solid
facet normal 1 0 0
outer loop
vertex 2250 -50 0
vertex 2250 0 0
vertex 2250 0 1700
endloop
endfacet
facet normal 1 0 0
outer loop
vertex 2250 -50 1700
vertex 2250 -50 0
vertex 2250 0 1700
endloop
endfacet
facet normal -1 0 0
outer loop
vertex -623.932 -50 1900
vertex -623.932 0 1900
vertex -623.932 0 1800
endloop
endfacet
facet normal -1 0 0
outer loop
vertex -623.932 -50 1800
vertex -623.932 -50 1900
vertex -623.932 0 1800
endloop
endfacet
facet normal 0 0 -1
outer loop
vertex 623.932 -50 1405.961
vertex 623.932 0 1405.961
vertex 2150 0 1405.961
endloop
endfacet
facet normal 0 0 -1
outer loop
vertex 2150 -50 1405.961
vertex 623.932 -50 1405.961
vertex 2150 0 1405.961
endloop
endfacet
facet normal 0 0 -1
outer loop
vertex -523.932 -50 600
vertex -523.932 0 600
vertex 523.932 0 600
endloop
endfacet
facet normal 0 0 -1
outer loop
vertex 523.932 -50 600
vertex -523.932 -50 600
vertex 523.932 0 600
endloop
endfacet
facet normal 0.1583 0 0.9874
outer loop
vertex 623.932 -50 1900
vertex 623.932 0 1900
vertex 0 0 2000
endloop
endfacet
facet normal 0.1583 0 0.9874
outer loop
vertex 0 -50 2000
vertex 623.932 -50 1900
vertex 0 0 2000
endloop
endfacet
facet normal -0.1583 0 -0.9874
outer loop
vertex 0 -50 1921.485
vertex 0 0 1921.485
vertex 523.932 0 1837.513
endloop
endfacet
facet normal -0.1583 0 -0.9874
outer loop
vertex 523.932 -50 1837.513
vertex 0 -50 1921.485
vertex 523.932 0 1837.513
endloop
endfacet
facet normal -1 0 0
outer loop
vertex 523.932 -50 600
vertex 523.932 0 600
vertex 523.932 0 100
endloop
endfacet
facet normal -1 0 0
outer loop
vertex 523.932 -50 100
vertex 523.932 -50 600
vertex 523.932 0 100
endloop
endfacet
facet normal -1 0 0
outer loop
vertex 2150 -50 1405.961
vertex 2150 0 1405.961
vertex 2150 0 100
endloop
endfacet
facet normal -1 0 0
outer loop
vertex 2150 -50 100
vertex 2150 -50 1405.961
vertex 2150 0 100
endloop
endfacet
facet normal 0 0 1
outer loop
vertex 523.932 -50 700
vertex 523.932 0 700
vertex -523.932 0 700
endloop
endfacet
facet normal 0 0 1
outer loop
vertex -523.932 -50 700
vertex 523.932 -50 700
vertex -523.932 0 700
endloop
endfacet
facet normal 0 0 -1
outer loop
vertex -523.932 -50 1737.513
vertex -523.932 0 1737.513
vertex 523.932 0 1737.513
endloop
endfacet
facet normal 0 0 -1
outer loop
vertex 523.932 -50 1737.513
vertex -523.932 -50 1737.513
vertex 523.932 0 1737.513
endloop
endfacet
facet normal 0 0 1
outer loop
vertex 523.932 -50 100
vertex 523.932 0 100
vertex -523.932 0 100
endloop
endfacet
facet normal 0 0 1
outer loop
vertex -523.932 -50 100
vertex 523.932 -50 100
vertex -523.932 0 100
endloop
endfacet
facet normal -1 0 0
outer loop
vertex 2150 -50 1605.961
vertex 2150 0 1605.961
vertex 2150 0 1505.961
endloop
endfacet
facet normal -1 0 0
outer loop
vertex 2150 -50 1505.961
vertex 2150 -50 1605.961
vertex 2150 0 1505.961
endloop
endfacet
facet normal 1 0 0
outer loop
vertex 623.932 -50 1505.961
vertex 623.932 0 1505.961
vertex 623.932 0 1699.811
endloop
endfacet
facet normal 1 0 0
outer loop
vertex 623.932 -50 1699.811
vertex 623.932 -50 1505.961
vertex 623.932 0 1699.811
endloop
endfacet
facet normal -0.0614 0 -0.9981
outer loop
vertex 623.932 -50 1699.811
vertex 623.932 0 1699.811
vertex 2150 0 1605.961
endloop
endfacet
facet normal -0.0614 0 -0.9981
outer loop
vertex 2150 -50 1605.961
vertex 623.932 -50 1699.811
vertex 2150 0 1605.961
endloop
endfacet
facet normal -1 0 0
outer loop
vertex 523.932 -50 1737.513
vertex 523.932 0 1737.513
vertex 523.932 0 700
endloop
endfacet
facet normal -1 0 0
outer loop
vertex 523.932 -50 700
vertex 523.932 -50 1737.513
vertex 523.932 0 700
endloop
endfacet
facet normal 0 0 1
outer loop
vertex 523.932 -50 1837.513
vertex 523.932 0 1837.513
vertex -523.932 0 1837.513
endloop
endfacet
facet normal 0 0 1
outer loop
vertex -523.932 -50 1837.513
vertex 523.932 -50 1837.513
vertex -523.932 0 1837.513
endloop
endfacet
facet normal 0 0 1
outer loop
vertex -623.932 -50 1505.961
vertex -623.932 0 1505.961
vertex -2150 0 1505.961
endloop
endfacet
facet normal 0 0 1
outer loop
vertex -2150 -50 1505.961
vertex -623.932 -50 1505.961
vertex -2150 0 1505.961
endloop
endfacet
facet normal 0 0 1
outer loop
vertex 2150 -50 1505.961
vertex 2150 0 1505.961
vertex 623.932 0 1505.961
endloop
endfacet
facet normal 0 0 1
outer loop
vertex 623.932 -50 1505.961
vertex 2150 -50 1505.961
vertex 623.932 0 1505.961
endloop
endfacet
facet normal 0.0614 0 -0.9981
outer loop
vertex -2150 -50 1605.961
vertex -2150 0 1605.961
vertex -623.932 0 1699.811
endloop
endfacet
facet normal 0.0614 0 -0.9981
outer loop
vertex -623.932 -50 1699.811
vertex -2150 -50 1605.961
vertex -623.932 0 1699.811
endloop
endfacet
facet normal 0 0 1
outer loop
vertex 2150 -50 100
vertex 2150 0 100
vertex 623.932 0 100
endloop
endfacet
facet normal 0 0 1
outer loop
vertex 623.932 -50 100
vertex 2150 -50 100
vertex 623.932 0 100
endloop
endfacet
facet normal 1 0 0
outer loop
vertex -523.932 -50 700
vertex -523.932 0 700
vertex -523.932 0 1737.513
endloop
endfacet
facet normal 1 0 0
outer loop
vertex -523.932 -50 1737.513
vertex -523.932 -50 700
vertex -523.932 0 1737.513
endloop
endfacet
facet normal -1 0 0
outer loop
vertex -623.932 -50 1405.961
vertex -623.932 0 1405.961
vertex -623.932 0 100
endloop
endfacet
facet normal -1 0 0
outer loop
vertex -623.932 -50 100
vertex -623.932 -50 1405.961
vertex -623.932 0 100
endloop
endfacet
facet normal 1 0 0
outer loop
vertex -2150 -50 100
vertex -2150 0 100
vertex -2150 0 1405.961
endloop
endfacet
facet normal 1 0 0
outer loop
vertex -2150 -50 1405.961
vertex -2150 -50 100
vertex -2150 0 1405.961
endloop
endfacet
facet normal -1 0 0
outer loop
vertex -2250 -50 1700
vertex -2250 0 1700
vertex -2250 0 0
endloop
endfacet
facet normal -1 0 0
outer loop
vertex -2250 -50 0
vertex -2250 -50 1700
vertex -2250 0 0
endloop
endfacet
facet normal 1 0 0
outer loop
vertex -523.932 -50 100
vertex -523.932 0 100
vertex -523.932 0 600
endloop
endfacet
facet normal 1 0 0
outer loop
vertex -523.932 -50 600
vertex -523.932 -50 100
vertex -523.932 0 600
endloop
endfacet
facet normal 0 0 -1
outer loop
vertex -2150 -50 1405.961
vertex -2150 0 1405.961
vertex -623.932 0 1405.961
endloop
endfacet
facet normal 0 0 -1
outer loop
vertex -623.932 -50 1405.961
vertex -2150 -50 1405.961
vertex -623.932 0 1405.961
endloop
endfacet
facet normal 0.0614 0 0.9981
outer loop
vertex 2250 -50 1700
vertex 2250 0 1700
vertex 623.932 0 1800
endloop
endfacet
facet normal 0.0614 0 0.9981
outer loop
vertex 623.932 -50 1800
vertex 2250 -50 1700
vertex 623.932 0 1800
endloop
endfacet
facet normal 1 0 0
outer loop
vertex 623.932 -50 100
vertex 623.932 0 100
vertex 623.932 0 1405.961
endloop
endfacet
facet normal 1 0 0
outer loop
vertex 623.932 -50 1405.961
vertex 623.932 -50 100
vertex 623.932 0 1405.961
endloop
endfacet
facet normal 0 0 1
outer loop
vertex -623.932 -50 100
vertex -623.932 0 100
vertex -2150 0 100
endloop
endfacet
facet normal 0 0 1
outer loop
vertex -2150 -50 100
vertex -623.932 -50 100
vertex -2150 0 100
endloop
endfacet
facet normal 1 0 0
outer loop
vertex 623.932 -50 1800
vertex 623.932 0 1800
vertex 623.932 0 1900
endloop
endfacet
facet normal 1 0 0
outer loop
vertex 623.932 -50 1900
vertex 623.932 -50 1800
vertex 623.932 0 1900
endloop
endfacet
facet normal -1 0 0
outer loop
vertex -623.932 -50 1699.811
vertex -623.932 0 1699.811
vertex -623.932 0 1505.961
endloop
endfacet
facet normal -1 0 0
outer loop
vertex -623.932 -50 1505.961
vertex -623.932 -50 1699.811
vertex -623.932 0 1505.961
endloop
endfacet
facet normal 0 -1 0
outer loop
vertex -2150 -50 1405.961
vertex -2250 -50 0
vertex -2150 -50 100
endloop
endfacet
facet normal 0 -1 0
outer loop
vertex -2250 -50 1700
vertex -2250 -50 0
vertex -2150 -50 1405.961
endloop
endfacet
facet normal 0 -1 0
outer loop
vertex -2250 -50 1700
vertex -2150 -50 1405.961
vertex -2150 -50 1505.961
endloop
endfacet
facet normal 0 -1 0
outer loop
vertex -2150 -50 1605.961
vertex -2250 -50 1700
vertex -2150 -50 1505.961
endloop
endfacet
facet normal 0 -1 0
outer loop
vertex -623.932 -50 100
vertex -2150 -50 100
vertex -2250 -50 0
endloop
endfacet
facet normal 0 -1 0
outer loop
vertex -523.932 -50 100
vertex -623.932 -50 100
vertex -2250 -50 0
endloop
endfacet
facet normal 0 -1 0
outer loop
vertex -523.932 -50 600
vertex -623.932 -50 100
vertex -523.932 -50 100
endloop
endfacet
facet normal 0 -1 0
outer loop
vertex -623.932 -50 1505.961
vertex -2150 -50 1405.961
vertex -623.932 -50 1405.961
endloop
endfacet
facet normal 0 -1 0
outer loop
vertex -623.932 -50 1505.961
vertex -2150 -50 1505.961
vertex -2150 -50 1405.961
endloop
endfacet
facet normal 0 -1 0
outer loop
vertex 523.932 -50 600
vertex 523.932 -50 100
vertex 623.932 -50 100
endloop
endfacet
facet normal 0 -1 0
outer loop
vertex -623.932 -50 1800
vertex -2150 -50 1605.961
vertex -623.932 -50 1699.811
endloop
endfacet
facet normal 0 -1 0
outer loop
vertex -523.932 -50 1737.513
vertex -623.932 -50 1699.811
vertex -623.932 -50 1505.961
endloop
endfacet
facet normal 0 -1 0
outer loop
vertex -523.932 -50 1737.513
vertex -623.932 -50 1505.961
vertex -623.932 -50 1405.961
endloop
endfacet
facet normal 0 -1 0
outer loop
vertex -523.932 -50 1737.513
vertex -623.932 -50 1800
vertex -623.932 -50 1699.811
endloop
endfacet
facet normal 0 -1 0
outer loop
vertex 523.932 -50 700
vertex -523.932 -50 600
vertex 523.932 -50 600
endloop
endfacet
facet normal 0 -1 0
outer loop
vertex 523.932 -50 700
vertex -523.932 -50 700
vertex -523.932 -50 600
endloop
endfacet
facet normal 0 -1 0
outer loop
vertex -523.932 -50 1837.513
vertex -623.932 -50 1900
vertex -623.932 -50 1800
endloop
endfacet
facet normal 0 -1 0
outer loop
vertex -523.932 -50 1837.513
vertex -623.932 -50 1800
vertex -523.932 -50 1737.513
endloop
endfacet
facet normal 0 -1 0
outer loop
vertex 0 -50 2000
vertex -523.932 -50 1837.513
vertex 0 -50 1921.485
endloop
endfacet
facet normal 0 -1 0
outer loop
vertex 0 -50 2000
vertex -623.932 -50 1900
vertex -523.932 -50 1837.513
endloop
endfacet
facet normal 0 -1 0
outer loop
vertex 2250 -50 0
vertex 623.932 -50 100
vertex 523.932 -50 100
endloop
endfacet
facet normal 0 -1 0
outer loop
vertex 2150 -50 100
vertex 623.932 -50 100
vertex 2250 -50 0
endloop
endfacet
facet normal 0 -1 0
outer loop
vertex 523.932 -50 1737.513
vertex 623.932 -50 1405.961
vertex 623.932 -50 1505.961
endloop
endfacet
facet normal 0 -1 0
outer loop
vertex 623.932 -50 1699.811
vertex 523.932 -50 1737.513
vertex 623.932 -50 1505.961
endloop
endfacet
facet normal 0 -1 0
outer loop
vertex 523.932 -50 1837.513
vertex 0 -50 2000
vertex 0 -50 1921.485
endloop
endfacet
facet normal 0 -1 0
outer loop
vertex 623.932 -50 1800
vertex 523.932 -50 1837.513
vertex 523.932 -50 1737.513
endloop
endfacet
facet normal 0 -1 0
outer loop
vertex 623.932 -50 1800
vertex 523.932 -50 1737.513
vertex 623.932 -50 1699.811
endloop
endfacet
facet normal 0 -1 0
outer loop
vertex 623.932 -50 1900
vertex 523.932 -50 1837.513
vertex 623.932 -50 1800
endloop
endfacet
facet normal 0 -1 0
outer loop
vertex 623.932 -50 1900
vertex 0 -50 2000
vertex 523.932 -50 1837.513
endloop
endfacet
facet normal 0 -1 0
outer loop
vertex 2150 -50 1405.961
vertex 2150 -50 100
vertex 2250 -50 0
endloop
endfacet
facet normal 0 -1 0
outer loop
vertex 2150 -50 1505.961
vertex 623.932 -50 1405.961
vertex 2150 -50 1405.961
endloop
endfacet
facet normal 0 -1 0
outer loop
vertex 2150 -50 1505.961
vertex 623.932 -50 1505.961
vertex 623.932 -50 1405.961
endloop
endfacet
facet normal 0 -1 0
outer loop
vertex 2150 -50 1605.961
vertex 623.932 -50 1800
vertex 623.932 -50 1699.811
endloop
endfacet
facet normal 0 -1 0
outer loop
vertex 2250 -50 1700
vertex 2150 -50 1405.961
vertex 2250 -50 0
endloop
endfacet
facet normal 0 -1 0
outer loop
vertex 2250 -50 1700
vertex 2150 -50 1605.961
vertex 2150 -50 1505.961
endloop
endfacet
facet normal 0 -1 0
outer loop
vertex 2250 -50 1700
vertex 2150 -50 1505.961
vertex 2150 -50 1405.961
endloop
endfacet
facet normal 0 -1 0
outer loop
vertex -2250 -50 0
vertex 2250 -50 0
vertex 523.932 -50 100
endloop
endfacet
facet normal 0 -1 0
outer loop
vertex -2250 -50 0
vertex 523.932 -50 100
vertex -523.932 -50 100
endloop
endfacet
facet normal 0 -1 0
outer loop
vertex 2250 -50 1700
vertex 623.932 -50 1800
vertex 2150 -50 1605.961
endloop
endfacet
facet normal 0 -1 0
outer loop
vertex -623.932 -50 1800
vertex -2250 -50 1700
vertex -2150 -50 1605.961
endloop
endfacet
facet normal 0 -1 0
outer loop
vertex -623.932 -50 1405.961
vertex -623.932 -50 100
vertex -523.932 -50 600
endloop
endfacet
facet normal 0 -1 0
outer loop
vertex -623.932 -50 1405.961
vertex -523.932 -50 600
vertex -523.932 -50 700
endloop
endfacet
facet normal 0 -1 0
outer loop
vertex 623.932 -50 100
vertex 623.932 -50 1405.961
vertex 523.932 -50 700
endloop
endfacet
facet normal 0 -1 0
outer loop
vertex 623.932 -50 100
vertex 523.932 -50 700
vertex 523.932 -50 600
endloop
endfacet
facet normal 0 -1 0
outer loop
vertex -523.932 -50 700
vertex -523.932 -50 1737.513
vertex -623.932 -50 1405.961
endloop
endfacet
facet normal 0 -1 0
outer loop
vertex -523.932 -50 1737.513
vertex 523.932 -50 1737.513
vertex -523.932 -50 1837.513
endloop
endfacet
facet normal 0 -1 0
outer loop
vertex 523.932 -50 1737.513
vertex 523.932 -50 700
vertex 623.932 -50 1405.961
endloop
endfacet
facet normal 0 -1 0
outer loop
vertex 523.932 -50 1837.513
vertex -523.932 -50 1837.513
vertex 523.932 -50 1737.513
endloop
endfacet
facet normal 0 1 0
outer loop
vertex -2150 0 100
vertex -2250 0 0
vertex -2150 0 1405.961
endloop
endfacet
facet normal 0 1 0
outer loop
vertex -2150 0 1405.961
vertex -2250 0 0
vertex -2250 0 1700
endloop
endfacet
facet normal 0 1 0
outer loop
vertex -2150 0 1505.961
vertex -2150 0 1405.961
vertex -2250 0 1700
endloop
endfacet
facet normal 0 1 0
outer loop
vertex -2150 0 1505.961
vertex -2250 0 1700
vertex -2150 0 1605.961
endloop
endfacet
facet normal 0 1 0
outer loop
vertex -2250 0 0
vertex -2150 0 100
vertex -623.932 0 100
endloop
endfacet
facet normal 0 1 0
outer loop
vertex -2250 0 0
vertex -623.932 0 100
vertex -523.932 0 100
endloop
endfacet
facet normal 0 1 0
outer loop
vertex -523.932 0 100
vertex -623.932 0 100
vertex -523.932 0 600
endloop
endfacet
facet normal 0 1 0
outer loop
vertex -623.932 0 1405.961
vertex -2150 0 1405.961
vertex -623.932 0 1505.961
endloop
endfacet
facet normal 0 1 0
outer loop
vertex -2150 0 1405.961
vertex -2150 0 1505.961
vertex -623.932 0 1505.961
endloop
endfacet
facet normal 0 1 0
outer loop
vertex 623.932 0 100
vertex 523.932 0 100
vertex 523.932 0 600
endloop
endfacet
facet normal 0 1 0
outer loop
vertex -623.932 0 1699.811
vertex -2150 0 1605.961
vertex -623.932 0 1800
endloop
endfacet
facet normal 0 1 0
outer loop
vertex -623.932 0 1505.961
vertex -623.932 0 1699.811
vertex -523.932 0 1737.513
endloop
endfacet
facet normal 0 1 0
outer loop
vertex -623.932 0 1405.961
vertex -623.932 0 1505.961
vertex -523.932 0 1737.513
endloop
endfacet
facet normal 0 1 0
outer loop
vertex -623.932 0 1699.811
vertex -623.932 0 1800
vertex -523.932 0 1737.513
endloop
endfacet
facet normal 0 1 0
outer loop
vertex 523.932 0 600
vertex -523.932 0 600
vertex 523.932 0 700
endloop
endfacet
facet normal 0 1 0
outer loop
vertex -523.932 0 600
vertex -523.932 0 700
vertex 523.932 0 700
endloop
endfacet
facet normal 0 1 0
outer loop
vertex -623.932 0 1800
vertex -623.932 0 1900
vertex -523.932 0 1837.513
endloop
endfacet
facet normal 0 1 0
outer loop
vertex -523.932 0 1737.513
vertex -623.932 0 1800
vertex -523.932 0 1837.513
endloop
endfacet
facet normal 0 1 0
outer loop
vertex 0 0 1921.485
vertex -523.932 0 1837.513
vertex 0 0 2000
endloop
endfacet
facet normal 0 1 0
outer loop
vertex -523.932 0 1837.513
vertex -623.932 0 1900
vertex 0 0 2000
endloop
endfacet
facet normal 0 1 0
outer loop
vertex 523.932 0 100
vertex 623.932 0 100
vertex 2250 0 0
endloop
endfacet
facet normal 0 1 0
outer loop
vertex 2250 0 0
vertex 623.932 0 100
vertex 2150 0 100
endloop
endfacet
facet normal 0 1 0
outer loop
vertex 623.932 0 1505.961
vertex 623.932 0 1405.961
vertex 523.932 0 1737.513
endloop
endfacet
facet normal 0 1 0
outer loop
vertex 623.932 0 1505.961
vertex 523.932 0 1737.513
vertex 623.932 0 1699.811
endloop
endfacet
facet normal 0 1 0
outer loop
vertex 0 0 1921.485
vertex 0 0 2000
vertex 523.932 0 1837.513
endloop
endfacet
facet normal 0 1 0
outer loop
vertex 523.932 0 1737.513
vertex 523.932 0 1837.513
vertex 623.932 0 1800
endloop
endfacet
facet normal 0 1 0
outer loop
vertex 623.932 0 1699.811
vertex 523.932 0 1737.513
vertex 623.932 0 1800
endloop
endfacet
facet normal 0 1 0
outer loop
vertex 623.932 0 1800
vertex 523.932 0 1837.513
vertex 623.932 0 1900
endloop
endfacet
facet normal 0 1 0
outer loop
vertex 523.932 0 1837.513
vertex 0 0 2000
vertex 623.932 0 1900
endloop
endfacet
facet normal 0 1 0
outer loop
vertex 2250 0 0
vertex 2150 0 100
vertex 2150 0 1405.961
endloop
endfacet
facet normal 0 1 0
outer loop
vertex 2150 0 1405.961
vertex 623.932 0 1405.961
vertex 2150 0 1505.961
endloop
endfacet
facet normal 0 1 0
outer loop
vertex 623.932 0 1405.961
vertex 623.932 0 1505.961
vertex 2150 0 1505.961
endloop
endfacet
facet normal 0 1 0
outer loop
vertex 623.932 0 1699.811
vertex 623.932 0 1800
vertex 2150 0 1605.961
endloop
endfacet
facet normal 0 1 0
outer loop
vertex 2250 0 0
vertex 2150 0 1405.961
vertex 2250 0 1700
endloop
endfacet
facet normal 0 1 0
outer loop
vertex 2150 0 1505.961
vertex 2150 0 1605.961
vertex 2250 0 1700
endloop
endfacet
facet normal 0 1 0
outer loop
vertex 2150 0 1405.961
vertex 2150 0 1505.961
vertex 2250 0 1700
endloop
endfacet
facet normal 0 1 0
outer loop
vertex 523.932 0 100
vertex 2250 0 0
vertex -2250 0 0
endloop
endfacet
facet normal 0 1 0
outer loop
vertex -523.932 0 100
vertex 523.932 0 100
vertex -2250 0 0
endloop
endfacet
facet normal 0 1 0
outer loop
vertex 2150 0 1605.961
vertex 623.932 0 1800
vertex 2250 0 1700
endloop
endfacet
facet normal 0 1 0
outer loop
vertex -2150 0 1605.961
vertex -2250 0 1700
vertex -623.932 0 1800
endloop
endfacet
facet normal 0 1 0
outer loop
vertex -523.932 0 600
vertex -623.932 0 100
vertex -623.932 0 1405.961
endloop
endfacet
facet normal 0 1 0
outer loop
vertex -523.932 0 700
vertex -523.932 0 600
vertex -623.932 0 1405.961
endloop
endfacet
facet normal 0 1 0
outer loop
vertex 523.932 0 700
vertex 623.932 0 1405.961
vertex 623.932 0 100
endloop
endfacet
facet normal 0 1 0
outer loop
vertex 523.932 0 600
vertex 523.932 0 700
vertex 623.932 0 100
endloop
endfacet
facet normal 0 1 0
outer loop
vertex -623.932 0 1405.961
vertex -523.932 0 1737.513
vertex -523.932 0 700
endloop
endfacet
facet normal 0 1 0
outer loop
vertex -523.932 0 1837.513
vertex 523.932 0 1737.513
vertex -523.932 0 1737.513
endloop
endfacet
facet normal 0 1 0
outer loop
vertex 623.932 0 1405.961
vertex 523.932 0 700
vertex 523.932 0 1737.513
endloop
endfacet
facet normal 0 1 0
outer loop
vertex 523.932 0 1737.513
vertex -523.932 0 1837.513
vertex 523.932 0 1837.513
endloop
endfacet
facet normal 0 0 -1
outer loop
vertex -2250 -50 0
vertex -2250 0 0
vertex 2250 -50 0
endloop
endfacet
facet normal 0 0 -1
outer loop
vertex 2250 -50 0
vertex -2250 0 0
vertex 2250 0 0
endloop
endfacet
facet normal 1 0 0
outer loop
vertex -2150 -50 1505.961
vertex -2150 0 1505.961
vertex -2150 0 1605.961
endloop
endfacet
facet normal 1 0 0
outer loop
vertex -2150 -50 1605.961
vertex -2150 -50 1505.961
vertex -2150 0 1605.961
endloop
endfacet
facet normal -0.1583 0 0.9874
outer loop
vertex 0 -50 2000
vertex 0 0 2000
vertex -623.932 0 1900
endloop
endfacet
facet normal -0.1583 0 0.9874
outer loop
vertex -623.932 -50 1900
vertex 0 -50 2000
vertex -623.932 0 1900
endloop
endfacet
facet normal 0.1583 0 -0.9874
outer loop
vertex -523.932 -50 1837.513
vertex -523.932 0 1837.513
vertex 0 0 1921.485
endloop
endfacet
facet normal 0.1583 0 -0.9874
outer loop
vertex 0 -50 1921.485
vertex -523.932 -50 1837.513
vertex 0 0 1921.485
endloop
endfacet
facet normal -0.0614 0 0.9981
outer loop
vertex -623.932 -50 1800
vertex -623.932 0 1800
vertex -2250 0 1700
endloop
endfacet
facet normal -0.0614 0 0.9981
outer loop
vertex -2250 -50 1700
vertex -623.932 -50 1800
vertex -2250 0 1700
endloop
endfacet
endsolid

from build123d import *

# Parameters (mm, degrees)
F1_DEPTH = 50


with BuildPart() as f1:
    # F0 (on Front) → F1 (new body)
    with BuildSketch(Plane.XZ):
        Polygon((-2250, 0), (0, 0), (2250, 0), (2250, 1700), (623.932258, 1800), (623.932258, 1900), (0, 2000), (-623.932258, 1900), (-623.932258, 1800), (-2250, 1700), align=None)
        Polygon((-2150, 1405.960883), (-623.932258, 1405.960883), (-623.932258, 600), (-623.932258, 100), (-2150, 100), align=None, mode=Mode.SUBTRACT)
        Polygon((0, 600), (523.932258, 600), (523.932258, 100), (0, 100), (-523.932258, 100), (-523.932258, 600), align=None, mode=Mode.SUBTRACT)
        Polygon((2150, 1405.960883), (2150, 100), (623.932258, 100), (623.932258, 600), (623.932258, 1405.960883), align=None, mode=Mode.SUBTRACT)
        Polygon((-623.932258, 1505.960883), (-2150, 1505.960883), (-2150, 1605.960883), (-623.932258, 1699.811078), align=None, mode=Mode.SUBTRACT)
        Polygon((-523.932258, 1737.512805), (523.932258, 1737.512805), (523.932258, 700), (0, 700), (-523.932258, 700), align=None, mode=Mode.SUBTRACT)
        Polygon((-523.932258, 1837.512805), (0, 1921.485424), (523.932258, 1837.512805), align=None, mode=Mode.SUBTRACT)
        Polygon((623.932258, 1505.960883), (623.932258, 1699.811078), (2150, 1605.960883), (2150, 1505.960883), align=None, mode=Mode.SUBTRACT)
    extrude(amount=F1_DEPTH)


solid = f1.part
